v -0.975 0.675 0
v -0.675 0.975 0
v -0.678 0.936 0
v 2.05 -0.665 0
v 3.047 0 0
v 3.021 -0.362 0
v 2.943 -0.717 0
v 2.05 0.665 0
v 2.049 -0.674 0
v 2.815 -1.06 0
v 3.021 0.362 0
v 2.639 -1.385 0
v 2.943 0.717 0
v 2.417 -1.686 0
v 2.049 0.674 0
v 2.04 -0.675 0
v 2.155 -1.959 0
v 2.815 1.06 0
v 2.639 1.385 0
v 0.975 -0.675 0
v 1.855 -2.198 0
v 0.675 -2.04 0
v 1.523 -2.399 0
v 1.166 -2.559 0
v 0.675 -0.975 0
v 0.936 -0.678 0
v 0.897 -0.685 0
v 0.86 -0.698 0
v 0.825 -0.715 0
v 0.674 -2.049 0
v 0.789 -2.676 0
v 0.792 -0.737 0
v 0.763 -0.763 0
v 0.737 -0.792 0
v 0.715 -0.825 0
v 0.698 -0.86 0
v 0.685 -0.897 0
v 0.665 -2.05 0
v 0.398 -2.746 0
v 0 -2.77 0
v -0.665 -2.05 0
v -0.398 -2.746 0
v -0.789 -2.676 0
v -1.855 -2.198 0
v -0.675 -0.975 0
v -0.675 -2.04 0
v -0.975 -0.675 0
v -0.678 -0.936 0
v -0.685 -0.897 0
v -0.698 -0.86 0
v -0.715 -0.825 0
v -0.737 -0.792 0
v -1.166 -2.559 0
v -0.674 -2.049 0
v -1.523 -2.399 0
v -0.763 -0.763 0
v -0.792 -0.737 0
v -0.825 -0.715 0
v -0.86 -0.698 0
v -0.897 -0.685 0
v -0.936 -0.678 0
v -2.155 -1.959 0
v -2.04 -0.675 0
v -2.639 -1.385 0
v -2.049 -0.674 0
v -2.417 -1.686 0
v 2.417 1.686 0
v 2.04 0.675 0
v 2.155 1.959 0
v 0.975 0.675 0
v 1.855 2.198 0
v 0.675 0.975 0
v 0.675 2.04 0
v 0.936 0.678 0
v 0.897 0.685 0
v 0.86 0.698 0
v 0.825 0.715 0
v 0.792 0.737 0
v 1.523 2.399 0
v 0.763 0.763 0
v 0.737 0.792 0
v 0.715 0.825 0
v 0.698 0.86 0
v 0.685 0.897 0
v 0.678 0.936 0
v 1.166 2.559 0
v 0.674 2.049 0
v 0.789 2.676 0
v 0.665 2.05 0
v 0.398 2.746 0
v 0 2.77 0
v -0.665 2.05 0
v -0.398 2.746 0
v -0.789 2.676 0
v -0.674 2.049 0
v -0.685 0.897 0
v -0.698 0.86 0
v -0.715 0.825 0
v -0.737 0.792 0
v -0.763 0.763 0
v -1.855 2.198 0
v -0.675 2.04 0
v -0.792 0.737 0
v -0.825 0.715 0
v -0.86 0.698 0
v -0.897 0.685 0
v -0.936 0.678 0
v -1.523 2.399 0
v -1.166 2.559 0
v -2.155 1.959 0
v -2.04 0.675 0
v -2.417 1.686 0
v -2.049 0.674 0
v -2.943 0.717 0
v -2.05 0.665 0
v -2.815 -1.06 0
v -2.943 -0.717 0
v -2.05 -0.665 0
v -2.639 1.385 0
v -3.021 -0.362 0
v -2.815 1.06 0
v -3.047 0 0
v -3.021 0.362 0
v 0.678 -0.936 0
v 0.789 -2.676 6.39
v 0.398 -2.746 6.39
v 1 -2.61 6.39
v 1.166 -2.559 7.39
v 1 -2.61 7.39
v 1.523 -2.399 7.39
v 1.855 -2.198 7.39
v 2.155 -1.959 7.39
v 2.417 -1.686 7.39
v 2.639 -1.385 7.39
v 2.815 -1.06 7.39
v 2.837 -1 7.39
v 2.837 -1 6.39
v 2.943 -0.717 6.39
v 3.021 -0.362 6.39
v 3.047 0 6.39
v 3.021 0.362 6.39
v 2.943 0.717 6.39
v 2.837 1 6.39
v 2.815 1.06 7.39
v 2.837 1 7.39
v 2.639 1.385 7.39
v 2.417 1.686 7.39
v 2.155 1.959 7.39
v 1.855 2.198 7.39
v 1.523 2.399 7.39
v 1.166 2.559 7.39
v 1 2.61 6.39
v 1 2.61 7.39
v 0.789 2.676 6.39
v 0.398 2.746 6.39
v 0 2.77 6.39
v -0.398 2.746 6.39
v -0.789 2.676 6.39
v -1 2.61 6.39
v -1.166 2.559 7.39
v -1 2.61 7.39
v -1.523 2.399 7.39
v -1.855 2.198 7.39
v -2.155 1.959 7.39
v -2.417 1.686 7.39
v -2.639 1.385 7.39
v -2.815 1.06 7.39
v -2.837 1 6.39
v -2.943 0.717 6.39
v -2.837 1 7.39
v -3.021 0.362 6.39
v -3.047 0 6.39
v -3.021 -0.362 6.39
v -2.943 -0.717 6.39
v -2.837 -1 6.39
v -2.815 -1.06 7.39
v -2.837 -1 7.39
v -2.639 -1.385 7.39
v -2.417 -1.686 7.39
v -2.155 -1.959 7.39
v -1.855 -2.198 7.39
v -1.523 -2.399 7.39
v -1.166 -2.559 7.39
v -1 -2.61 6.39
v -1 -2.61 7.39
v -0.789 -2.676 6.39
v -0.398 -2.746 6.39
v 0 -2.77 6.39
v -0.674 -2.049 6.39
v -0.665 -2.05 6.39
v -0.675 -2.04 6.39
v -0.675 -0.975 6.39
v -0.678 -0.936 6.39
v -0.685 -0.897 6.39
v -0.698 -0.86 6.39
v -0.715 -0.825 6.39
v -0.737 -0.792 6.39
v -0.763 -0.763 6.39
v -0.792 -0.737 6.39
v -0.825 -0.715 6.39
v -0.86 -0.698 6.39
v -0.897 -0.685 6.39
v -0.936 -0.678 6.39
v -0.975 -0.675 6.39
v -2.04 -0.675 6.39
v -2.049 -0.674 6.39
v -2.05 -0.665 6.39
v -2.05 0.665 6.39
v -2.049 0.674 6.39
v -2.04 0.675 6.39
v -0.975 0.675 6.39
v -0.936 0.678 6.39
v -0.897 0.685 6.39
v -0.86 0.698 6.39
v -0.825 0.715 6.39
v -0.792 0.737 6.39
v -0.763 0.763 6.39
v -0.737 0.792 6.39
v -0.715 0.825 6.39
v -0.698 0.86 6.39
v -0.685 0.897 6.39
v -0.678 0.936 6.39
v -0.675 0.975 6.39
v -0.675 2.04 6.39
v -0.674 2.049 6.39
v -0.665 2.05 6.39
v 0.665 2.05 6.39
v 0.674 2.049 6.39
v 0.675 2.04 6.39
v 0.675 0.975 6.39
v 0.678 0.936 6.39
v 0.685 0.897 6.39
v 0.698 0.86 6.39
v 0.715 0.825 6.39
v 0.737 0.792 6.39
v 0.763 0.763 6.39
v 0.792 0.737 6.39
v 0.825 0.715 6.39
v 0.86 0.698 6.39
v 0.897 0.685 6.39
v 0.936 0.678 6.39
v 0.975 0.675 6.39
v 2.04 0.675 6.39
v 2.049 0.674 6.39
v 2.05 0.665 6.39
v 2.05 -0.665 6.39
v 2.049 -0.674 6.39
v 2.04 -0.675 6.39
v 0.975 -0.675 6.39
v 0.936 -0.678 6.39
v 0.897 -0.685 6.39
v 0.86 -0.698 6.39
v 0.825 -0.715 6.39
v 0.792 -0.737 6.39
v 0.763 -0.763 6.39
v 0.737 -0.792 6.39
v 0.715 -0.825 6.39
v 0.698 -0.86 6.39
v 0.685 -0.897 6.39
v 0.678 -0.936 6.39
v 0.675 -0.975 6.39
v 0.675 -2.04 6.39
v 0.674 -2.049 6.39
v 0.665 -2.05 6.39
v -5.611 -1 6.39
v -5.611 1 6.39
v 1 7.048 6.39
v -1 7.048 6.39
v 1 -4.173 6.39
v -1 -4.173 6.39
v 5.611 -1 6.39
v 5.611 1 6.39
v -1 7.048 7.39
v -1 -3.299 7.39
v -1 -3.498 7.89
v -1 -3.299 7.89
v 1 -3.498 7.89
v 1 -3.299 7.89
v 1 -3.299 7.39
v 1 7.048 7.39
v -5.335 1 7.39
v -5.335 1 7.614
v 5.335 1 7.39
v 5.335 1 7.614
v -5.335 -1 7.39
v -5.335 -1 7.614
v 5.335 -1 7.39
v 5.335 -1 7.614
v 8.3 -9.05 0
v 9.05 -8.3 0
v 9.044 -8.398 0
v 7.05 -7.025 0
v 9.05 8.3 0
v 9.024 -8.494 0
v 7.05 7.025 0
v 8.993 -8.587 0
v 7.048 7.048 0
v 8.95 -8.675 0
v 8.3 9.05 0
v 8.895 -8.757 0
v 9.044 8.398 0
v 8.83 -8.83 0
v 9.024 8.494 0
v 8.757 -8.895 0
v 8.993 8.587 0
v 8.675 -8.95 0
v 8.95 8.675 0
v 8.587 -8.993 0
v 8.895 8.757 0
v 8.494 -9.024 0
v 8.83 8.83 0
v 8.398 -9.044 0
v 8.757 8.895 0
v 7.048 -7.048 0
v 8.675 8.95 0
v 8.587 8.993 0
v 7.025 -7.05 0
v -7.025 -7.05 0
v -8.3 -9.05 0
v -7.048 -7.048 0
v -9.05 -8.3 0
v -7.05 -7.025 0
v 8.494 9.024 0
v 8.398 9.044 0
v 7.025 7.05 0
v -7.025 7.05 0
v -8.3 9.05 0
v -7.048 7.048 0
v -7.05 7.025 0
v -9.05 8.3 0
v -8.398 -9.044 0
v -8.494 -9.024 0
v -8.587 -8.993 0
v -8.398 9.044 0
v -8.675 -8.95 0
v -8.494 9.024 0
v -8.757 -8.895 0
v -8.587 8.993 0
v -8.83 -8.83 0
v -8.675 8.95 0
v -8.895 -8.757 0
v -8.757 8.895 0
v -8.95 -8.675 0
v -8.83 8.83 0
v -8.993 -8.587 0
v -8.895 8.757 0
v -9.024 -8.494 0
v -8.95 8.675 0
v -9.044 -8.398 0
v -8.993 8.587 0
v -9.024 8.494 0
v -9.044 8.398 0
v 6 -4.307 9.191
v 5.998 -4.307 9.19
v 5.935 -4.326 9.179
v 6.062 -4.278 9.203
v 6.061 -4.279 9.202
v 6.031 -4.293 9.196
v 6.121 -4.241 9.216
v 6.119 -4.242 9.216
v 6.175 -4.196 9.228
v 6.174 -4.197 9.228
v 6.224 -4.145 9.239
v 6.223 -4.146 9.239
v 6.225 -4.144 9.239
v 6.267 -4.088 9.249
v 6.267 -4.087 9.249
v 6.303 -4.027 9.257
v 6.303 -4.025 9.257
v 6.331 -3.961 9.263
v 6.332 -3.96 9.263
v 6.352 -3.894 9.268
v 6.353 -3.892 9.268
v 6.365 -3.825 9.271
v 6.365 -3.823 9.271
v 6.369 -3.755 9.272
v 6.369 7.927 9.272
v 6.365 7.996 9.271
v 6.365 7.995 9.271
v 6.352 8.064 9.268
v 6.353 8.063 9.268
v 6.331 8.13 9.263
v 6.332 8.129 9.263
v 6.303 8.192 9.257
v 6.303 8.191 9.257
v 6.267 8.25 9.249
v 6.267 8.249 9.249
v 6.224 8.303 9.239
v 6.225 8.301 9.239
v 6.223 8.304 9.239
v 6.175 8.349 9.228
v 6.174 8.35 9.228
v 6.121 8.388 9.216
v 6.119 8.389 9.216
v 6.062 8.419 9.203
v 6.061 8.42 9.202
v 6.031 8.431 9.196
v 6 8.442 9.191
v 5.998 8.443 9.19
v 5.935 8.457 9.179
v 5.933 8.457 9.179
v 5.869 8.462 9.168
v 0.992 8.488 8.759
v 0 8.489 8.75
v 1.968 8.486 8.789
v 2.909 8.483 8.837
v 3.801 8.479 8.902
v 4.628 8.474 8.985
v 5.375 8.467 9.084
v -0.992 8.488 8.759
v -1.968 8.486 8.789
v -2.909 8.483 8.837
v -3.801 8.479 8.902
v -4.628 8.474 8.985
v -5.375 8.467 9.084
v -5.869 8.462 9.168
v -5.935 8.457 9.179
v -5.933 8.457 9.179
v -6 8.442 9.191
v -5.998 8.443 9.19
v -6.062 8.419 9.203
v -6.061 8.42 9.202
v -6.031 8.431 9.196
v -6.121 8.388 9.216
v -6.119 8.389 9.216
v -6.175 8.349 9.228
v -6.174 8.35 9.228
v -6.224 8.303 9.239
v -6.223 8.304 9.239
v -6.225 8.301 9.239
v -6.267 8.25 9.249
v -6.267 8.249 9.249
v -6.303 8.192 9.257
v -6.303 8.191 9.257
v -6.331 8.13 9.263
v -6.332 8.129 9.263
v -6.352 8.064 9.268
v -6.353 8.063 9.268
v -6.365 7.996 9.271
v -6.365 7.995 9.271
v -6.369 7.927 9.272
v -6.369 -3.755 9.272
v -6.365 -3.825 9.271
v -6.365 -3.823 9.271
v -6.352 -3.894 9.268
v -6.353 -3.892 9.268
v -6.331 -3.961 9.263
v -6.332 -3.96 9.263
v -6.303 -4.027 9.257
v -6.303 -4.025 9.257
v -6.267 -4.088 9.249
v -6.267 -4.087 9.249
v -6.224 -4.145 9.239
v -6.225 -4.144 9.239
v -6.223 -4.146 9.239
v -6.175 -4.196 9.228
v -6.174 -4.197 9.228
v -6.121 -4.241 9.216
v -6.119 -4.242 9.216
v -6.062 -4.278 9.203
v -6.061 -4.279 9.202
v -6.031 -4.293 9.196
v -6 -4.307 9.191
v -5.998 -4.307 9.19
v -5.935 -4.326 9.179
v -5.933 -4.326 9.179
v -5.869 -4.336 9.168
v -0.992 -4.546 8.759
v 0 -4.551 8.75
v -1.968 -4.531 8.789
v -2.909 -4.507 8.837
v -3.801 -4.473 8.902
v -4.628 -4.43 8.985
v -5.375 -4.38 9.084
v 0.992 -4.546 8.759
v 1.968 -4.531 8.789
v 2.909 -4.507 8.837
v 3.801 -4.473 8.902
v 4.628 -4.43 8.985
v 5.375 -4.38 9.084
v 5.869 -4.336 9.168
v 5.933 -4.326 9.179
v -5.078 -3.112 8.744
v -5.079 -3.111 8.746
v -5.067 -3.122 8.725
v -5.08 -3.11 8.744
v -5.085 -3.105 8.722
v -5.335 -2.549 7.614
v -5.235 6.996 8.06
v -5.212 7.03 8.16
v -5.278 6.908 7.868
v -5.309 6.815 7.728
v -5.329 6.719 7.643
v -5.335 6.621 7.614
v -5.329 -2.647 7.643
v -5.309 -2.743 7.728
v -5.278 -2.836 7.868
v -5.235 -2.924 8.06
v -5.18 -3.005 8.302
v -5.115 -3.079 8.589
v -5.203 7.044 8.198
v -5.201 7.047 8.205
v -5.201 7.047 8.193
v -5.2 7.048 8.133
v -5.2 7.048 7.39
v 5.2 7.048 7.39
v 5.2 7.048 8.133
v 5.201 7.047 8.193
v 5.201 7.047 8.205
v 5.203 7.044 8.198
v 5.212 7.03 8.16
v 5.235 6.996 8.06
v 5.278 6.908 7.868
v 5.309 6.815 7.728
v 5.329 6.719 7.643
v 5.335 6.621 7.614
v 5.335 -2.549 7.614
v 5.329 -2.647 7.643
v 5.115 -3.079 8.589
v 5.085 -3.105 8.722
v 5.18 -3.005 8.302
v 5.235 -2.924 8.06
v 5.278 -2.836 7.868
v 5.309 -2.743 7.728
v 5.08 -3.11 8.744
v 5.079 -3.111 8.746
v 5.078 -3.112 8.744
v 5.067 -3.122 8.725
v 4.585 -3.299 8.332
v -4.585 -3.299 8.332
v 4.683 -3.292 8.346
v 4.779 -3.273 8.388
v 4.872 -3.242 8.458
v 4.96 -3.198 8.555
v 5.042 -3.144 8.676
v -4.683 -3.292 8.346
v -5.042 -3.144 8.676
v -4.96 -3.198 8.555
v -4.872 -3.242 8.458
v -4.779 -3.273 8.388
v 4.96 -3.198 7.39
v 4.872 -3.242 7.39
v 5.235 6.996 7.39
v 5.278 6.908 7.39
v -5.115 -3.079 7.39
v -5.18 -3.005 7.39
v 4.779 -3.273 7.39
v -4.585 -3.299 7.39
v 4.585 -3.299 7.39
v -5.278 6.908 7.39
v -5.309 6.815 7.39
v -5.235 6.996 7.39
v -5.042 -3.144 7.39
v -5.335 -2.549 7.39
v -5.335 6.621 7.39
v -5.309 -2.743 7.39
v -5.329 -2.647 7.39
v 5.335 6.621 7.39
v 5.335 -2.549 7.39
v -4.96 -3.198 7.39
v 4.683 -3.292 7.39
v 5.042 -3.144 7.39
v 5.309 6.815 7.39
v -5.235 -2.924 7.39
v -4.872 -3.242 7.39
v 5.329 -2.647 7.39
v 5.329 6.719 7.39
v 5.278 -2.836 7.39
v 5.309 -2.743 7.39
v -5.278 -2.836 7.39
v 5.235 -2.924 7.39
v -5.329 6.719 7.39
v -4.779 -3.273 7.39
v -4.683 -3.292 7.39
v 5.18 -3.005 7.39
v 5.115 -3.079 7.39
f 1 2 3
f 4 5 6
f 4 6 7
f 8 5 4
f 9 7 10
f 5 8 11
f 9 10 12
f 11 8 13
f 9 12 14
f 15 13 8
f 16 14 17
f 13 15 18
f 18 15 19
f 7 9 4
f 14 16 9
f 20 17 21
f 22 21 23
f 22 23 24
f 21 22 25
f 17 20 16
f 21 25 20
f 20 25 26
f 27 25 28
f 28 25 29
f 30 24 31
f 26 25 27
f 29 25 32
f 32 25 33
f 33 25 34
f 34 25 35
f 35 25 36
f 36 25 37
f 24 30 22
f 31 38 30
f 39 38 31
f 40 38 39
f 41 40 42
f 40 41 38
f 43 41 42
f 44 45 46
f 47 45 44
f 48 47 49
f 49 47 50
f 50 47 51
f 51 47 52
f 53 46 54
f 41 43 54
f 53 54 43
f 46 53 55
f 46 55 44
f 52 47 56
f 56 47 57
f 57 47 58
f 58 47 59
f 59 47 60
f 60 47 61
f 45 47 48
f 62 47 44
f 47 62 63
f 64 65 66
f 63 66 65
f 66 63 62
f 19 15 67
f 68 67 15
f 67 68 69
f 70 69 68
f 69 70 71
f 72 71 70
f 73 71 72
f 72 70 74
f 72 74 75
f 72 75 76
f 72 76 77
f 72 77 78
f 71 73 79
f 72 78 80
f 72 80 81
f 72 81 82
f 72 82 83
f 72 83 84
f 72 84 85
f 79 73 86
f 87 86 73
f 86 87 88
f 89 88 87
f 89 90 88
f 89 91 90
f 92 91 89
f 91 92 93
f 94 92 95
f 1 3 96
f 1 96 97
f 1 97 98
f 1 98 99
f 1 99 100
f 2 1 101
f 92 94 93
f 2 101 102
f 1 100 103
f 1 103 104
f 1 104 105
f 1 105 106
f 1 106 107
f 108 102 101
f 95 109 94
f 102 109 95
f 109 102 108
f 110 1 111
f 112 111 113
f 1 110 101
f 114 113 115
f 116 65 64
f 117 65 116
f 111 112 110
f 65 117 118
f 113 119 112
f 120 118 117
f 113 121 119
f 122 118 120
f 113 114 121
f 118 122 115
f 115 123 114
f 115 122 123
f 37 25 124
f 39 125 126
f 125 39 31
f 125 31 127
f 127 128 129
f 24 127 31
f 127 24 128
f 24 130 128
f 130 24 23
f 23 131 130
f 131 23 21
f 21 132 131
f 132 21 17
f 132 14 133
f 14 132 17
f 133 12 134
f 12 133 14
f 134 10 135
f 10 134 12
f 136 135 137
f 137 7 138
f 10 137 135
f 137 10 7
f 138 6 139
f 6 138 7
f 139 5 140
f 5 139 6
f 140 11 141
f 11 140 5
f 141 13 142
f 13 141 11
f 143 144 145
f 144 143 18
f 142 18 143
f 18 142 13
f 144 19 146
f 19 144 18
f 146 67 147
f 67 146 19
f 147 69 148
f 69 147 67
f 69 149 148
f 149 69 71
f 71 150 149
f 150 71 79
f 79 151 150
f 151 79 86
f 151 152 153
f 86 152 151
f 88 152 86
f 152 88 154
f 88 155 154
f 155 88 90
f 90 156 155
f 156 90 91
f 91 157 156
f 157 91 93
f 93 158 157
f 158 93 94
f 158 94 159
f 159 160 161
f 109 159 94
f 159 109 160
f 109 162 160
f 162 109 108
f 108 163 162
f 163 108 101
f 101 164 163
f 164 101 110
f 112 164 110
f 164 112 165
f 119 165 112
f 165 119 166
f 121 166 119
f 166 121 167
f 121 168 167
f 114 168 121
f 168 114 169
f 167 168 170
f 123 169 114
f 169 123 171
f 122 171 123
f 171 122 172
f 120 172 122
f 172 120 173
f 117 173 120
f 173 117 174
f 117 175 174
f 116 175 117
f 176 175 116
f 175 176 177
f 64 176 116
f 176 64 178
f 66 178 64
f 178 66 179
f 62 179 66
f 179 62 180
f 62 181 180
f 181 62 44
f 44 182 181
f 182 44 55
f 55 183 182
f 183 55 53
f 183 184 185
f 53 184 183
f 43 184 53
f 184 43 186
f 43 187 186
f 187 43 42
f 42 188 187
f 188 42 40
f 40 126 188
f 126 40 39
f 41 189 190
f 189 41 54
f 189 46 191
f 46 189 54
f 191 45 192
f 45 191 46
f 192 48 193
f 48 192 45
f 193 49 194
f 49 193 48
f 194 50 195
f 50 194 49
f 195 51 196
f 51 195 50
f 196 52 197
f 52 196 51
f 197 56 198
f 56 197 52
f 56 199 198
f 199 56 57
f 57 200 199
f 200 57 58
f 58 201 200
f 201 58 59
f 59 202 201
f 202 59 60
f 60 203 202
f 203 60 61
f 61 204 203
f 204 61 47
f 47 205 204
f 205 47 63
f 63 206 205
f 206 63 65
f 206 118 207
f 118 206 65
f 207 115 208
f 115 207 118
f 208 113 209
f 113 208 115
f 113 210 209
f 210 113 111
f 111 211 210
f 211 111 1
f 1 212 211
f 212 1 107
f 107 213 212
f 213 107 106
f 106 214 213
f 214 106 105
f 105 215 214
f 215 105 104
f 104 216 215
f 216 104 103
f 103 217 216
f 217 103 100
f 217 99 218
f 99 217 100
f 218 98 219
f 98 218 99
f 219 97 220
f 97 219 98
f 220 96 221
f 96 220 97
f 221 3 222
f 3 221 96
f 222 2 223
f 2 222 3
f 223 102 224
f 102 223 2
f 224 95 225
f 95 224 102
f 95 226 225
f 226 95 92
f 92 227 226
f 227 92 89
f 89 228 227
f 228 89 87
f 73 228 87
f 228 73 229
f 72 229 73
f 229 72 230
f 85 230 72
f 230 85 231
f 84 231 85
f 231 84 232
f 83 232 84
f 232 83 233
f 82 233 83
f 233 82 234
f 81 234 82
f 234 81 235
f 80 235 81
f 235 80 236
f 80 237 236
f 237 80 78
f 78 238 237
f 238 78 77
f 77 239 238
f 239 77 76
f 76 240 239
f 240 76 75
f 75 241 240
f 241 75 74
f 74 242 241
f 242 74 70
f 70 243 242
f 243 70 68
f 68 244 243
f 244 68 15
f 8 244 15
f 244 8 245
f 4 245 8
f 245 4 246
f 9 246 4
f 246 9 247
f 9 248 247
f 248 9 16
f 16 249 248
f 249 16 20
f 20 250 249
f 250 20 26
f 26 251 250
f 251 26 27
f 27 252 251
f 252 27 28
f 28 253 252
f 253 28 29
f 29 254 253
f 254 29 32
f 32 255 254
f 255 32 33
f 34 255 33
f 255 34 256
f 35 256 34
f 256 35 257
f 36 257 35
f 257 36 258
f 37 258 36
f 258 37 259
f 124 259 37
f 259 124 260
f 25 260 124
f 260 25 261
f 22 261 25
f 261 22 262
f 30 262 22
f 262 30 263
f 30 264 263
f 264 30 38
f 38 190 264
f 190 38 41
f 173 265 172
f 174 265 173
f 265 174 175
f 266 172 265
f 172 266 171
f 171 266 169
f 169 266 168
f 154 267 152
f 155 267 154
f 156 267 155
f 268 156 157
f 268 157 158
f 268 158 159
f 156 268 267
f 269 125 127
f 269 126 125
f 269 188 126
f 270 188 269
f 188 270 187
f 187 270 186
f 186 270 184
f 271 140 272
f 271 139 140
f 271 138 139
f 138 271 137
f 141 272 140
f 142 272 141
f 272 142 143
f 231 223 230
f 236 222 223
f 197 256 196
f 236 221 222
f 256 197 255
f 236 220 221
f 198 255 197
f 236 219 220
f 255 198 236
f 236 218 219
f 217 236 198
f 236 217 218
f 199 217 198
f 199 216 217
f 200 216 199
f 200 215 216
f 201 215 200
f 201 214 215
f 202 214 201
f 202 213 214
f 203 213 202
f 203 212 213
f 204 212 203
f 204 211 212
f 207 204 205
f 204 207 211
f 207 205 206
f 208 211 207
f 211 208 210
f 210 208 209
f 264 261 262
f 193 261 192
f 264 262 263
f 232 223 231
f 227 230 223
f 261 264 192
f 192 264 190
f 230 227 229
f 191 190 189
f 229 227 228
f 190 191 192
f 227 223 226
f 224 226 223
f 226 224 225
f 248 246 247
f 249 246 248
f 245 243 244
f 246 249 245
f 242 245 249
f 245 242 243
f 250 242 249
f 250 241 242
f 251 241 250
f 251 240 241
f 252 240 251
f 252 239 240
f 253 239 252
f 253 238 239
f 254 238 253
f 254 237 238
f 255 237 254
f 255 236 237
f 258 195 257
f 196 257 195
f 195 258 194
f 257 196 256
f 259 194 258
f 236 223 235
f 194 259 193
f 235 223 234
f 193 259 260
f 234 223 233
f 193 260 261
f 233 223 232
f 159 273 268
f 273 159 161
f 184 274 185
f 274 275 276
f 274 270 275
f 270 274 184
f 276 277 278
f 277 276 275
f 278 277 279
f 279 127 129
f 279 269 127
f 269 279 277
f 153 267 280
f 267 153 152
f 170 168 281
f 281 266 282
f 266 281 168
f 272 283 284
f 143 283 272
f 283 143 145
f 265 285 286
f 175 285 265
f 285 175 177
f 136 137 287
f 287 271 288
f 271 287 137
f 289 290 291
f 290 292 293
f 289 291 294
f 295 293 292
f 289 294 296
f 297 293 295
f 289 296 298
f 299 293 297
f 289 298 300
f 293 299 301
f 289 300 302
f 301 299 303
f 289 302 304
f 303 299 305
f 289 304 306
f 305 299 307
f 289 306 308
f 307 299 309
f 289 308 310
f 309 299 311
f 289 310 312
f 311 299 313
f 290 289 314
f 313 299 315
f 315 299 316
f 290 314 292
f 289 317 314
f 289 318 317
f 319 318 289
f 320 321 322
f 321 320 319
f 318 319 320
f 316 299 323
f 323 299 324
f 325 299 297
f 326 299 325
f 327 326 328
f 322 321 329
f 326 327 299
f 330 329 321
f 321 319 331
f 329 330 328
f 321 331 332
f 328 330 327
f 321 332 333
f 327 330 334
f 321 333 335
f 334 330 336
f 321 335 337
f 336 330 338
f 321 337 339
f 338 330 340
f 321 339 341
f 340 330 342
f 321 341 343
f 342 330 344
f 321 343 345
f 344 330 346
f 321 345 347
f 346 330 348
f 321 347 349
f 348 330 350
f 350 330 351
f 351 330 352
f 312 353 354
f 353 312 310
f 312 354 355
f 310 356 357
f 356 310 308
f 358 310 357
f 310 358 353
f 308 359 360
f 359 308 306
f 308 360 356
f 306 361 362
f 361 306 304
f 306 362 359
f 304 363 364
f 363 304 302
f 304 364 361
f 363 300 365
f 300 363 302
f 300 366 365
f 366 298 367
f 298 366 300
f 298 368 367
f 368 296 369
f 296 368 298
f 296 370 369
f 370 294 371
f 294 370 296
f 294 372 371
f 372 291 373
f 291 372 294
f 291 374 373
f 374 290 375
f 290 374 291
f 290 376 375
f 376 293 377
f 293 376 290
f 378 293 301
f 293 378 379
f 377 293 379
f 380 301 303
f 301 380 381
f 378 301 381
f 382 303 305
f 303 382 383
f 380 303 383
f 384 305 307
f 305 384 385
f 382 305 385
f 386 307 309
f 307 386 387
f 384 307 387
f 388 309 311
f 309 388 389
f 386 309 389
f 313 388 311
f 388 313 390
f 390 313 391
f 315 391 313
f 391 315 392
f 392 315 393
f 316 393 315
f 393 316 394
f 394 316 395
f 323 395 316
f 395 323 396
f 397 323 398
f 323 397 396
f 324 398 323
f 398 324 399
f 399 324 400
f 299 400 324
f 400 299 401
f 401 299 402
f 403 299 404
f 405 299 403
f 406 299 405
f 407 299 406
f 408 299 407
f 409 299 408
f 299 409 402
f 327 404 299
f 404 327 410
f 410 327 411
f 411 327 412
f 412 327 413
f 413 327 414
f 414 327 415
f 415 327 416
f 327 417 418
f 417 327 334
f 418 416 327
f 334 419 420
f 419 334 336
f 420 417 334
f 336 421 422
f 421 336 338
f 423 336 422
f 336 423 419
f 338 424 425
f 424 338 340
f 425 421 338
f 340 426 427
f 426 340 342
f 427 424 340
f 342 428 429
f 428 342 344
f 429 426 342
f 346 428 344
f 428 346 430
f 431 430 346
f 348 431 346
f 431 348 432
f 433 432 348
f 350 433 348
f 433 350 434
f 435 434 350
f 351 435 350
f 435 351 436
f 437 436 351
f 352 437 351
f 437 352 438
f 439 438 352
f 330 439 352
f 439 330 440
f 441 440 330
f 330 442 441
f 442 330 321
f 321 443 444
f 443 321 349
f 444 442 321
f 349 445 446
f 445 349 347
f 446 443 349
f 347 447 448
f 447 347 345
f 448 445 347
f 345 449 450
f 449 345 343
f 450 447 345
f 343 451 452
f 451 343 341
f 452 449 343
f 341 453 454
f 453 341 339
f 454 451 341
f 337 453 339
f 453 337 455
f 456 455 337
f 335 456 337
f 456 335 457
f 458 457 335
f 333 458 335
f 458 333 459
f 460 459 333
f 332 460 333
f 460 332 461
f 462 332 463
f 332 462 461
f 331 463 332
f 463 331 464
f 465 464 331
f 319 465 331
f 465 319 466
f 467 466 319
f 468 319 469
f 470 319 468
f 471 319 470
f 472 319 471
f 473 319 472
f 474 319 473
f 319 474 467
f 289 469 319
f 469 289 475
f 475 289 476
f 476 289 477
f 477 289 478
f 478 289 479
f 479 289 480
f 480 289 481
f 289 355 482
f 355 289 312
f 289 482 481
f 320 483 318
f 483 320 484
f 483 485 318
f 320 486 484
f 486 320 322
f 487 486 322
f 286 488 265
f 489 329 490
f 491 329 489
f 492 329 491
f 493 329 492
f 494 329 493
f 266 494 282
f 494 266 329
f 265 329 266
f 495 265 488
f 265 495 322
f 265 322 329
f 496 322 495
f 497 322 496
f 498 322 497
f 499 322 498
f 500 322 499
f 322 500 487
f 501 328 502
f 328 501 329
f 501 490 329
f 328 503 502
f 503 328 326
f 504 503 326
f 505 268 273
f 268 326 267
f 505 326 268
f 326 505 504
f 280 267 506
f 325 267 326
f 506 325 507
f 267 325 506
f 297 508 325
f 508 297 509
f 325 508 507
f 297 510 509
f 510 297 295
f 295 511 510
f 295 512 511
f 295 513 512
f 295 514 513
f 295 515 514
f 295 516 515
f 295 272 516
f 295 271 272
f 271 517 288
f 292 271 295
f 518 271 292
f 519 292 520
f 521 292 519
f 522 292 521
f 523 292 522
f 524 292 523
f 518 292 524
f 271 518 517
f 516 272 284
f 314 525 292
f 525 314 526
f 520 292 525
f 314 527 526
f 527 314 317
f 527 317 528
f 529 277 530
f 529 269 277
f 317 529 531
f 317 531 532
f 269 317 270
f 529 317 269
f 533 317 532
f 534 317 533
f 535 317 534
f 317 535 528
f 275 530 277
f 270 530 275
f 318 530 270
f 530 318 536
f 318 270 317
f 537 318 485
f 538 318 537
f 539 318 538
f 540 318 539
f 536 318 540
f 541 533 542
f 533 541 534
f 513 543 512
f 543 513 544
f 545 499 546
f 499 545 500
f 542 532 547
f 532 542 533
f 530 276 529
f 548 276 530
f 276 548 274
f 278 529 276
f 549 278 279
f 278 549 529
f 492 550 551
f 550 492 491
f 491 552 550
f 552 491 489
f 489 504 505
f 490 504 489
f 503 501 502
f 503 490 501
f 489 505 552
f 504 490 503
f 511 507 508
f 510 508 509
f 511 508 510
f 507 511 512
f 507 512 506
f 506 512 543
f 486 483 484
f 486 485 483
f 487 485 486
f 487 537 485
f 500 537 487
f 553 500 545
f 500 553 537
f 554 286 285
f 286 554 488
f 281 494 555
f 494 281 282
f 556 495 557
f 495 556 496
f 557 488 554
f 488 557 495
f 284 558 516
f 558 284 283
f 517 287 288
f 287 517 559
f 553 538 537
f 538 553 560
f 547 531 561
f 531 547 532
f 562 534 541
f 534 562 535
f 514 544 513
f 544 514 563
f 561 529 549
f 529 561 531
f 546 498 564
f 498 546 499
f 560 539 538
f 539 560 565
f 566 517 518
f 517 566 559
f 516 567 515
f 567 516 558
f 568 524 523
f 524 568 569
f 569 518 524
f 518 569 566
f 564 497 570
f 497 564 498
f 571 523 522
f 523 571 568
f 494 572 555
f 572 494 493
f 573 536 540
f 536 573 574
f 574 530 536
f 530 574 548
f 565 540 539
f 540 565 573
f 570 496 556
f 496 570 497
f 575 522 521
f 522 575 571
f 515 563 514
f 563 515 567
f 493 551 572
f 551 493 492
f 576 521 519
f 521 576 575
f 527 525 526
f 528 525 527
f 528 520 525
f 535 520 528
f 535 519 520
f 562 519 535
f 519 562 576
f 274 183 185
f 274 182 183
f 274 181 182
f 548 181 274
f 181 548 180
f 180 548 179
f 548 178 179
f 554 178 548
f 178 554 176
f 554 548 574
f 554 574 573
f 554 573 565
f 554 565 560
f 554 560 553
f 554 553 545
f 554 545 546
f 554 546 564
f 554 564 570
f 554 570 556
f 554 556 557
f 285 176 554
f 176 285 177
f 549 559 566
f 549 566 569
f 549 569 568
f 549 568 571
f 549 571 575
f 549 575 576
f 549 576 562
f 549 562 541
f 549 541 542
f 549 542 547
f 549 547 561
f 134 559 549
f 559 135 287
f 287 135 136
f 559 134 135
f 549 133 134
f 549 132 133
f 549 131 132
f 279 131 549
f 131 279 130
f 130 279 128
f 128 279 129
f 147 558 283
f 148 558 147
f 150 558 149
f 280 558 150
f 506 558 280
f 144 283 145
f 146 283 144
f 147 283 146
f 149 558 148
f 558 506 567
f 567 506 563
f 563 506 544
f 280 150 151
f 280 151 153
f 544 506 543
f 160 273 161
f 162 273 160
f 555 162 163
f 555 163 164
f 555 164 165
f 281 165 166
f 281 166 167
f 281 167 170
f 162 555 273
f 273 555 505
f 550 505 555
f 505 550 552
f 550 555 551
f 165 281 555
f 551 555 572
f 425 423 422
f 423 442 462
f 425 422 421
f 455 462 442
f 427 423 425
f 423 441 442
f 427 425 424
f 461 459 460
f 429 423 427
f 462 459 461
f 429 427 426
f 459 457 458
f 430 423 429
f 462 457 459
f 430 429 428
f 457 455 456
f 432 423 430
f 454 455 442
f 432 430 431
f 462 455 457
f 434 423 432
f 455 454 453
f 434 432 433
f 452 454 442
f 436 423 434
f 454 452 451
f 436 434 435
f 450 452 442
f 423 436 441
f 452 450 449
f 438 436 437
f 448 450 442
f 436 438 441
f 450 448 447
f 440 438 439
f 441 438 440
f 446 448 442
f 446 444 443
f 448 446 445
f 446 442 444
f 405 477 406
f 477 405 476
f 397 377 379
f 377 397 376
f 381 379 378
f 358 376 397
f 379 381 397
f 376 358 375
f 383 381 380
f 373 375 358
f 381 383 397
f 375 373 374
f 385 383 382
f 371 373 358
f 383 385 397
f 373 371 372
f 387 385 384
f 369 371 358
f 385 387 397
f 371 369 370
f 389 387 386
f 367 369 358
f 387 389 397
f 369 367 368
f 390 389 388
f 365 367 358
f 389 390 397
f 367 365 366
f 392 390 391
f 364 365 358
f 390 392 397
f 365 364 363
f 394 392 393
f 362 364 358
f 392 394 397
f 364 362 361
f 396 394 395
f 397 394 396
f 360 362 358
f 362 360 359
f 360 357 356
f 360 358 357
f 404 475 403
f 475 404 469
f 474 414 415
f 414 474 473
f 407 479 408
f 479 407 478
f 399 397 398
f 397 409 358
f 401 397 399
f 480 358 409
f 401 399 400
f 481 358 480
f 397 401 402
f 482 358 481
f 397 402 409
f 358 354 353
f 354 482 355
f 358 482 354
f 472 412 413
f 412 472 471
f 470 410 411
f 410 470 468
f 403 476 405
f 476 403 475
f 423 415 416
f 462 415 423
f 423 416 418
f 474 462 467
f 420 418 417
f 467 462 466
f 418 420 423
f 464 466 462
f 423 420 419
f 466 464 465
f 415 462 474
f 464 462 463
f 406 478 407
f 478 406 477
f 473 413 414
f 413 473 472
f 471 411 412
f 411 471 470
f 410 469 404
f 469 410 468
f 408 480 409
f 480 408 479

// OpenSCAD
$fn = 48;

side = 18.1;
height = 9.39;

shell_t = 2;
shell_r = 0.75;
shell_shear = 0.7;

stem_h = 7.5;
stem_d = 5.54;
stem_hole_w = 1.35;
stem_hole_d = 4.1;
stem_hole_r = 0.3;

rib_h = 1.5;
rib_w = 2;


module stem() {
    linear_extrude(stem_h)
    difference() {
        scale([1.1, 1])
        circle(stem_d / 2);

        offset(-stem_hole_r)
        offset(stem_hole_r) {
            square([stem_hole_w, stem_hole_d], center = true);
            square([stem_hole_d, stem_hole_w], center = true);
        }
    }

    translate([0, side * (1 - shell_shear) * 0.75 / 2, height - rib_h * 2])
    linear_extrude(rib_h) {
        square([rib_w, side * shell_shear], center = true);
    }

    translate([0, 0, height - rib_h * 2])
    linear_extrude(rib_h) {
        square([side * shell_shear, rib_w], center = true);
    }
}


module shell() {
    m = [
        [1, 0, 0, 0],
        [0, 1, (1 - shell_shear) * 0.75, 0],
        [0, 0, 1, 0],
        [0, 0, 0, 1],
    ];

    multmatrix(m)
    linear_extrude(height, scale = shell_shear, convexity = 4)
    offset(shell_r)
    offset(- shell_r)
    difference() {
        square([side, side], center = true);
        square([side - shell_t * 2, side - shell_t * 2], center = true);
    }

    translate([0, side * (1 - shell_shear) * 0.75 / 2, height - shell_t / 2])
    linear_extrude(shell_t, center = true)
    offset(shell_r)
    offset(- shell_r - shell_t / 2)
        square([side, side] * shell_shear, center = true);
}


module assembly() {
    difference() {
        union() {
            stem();
            shell();
        }

        top_side = side * shell_shear * 1.2;

        translate([0, side * (1 - shell_shear) * 0.75 / 2, height + 0.5])
        scale([1, 1, 0.15])
        rotate([90, 0, 0])
            cylinder(top_side, r = top_side / 2, center = true);
    }
}


assembly();
